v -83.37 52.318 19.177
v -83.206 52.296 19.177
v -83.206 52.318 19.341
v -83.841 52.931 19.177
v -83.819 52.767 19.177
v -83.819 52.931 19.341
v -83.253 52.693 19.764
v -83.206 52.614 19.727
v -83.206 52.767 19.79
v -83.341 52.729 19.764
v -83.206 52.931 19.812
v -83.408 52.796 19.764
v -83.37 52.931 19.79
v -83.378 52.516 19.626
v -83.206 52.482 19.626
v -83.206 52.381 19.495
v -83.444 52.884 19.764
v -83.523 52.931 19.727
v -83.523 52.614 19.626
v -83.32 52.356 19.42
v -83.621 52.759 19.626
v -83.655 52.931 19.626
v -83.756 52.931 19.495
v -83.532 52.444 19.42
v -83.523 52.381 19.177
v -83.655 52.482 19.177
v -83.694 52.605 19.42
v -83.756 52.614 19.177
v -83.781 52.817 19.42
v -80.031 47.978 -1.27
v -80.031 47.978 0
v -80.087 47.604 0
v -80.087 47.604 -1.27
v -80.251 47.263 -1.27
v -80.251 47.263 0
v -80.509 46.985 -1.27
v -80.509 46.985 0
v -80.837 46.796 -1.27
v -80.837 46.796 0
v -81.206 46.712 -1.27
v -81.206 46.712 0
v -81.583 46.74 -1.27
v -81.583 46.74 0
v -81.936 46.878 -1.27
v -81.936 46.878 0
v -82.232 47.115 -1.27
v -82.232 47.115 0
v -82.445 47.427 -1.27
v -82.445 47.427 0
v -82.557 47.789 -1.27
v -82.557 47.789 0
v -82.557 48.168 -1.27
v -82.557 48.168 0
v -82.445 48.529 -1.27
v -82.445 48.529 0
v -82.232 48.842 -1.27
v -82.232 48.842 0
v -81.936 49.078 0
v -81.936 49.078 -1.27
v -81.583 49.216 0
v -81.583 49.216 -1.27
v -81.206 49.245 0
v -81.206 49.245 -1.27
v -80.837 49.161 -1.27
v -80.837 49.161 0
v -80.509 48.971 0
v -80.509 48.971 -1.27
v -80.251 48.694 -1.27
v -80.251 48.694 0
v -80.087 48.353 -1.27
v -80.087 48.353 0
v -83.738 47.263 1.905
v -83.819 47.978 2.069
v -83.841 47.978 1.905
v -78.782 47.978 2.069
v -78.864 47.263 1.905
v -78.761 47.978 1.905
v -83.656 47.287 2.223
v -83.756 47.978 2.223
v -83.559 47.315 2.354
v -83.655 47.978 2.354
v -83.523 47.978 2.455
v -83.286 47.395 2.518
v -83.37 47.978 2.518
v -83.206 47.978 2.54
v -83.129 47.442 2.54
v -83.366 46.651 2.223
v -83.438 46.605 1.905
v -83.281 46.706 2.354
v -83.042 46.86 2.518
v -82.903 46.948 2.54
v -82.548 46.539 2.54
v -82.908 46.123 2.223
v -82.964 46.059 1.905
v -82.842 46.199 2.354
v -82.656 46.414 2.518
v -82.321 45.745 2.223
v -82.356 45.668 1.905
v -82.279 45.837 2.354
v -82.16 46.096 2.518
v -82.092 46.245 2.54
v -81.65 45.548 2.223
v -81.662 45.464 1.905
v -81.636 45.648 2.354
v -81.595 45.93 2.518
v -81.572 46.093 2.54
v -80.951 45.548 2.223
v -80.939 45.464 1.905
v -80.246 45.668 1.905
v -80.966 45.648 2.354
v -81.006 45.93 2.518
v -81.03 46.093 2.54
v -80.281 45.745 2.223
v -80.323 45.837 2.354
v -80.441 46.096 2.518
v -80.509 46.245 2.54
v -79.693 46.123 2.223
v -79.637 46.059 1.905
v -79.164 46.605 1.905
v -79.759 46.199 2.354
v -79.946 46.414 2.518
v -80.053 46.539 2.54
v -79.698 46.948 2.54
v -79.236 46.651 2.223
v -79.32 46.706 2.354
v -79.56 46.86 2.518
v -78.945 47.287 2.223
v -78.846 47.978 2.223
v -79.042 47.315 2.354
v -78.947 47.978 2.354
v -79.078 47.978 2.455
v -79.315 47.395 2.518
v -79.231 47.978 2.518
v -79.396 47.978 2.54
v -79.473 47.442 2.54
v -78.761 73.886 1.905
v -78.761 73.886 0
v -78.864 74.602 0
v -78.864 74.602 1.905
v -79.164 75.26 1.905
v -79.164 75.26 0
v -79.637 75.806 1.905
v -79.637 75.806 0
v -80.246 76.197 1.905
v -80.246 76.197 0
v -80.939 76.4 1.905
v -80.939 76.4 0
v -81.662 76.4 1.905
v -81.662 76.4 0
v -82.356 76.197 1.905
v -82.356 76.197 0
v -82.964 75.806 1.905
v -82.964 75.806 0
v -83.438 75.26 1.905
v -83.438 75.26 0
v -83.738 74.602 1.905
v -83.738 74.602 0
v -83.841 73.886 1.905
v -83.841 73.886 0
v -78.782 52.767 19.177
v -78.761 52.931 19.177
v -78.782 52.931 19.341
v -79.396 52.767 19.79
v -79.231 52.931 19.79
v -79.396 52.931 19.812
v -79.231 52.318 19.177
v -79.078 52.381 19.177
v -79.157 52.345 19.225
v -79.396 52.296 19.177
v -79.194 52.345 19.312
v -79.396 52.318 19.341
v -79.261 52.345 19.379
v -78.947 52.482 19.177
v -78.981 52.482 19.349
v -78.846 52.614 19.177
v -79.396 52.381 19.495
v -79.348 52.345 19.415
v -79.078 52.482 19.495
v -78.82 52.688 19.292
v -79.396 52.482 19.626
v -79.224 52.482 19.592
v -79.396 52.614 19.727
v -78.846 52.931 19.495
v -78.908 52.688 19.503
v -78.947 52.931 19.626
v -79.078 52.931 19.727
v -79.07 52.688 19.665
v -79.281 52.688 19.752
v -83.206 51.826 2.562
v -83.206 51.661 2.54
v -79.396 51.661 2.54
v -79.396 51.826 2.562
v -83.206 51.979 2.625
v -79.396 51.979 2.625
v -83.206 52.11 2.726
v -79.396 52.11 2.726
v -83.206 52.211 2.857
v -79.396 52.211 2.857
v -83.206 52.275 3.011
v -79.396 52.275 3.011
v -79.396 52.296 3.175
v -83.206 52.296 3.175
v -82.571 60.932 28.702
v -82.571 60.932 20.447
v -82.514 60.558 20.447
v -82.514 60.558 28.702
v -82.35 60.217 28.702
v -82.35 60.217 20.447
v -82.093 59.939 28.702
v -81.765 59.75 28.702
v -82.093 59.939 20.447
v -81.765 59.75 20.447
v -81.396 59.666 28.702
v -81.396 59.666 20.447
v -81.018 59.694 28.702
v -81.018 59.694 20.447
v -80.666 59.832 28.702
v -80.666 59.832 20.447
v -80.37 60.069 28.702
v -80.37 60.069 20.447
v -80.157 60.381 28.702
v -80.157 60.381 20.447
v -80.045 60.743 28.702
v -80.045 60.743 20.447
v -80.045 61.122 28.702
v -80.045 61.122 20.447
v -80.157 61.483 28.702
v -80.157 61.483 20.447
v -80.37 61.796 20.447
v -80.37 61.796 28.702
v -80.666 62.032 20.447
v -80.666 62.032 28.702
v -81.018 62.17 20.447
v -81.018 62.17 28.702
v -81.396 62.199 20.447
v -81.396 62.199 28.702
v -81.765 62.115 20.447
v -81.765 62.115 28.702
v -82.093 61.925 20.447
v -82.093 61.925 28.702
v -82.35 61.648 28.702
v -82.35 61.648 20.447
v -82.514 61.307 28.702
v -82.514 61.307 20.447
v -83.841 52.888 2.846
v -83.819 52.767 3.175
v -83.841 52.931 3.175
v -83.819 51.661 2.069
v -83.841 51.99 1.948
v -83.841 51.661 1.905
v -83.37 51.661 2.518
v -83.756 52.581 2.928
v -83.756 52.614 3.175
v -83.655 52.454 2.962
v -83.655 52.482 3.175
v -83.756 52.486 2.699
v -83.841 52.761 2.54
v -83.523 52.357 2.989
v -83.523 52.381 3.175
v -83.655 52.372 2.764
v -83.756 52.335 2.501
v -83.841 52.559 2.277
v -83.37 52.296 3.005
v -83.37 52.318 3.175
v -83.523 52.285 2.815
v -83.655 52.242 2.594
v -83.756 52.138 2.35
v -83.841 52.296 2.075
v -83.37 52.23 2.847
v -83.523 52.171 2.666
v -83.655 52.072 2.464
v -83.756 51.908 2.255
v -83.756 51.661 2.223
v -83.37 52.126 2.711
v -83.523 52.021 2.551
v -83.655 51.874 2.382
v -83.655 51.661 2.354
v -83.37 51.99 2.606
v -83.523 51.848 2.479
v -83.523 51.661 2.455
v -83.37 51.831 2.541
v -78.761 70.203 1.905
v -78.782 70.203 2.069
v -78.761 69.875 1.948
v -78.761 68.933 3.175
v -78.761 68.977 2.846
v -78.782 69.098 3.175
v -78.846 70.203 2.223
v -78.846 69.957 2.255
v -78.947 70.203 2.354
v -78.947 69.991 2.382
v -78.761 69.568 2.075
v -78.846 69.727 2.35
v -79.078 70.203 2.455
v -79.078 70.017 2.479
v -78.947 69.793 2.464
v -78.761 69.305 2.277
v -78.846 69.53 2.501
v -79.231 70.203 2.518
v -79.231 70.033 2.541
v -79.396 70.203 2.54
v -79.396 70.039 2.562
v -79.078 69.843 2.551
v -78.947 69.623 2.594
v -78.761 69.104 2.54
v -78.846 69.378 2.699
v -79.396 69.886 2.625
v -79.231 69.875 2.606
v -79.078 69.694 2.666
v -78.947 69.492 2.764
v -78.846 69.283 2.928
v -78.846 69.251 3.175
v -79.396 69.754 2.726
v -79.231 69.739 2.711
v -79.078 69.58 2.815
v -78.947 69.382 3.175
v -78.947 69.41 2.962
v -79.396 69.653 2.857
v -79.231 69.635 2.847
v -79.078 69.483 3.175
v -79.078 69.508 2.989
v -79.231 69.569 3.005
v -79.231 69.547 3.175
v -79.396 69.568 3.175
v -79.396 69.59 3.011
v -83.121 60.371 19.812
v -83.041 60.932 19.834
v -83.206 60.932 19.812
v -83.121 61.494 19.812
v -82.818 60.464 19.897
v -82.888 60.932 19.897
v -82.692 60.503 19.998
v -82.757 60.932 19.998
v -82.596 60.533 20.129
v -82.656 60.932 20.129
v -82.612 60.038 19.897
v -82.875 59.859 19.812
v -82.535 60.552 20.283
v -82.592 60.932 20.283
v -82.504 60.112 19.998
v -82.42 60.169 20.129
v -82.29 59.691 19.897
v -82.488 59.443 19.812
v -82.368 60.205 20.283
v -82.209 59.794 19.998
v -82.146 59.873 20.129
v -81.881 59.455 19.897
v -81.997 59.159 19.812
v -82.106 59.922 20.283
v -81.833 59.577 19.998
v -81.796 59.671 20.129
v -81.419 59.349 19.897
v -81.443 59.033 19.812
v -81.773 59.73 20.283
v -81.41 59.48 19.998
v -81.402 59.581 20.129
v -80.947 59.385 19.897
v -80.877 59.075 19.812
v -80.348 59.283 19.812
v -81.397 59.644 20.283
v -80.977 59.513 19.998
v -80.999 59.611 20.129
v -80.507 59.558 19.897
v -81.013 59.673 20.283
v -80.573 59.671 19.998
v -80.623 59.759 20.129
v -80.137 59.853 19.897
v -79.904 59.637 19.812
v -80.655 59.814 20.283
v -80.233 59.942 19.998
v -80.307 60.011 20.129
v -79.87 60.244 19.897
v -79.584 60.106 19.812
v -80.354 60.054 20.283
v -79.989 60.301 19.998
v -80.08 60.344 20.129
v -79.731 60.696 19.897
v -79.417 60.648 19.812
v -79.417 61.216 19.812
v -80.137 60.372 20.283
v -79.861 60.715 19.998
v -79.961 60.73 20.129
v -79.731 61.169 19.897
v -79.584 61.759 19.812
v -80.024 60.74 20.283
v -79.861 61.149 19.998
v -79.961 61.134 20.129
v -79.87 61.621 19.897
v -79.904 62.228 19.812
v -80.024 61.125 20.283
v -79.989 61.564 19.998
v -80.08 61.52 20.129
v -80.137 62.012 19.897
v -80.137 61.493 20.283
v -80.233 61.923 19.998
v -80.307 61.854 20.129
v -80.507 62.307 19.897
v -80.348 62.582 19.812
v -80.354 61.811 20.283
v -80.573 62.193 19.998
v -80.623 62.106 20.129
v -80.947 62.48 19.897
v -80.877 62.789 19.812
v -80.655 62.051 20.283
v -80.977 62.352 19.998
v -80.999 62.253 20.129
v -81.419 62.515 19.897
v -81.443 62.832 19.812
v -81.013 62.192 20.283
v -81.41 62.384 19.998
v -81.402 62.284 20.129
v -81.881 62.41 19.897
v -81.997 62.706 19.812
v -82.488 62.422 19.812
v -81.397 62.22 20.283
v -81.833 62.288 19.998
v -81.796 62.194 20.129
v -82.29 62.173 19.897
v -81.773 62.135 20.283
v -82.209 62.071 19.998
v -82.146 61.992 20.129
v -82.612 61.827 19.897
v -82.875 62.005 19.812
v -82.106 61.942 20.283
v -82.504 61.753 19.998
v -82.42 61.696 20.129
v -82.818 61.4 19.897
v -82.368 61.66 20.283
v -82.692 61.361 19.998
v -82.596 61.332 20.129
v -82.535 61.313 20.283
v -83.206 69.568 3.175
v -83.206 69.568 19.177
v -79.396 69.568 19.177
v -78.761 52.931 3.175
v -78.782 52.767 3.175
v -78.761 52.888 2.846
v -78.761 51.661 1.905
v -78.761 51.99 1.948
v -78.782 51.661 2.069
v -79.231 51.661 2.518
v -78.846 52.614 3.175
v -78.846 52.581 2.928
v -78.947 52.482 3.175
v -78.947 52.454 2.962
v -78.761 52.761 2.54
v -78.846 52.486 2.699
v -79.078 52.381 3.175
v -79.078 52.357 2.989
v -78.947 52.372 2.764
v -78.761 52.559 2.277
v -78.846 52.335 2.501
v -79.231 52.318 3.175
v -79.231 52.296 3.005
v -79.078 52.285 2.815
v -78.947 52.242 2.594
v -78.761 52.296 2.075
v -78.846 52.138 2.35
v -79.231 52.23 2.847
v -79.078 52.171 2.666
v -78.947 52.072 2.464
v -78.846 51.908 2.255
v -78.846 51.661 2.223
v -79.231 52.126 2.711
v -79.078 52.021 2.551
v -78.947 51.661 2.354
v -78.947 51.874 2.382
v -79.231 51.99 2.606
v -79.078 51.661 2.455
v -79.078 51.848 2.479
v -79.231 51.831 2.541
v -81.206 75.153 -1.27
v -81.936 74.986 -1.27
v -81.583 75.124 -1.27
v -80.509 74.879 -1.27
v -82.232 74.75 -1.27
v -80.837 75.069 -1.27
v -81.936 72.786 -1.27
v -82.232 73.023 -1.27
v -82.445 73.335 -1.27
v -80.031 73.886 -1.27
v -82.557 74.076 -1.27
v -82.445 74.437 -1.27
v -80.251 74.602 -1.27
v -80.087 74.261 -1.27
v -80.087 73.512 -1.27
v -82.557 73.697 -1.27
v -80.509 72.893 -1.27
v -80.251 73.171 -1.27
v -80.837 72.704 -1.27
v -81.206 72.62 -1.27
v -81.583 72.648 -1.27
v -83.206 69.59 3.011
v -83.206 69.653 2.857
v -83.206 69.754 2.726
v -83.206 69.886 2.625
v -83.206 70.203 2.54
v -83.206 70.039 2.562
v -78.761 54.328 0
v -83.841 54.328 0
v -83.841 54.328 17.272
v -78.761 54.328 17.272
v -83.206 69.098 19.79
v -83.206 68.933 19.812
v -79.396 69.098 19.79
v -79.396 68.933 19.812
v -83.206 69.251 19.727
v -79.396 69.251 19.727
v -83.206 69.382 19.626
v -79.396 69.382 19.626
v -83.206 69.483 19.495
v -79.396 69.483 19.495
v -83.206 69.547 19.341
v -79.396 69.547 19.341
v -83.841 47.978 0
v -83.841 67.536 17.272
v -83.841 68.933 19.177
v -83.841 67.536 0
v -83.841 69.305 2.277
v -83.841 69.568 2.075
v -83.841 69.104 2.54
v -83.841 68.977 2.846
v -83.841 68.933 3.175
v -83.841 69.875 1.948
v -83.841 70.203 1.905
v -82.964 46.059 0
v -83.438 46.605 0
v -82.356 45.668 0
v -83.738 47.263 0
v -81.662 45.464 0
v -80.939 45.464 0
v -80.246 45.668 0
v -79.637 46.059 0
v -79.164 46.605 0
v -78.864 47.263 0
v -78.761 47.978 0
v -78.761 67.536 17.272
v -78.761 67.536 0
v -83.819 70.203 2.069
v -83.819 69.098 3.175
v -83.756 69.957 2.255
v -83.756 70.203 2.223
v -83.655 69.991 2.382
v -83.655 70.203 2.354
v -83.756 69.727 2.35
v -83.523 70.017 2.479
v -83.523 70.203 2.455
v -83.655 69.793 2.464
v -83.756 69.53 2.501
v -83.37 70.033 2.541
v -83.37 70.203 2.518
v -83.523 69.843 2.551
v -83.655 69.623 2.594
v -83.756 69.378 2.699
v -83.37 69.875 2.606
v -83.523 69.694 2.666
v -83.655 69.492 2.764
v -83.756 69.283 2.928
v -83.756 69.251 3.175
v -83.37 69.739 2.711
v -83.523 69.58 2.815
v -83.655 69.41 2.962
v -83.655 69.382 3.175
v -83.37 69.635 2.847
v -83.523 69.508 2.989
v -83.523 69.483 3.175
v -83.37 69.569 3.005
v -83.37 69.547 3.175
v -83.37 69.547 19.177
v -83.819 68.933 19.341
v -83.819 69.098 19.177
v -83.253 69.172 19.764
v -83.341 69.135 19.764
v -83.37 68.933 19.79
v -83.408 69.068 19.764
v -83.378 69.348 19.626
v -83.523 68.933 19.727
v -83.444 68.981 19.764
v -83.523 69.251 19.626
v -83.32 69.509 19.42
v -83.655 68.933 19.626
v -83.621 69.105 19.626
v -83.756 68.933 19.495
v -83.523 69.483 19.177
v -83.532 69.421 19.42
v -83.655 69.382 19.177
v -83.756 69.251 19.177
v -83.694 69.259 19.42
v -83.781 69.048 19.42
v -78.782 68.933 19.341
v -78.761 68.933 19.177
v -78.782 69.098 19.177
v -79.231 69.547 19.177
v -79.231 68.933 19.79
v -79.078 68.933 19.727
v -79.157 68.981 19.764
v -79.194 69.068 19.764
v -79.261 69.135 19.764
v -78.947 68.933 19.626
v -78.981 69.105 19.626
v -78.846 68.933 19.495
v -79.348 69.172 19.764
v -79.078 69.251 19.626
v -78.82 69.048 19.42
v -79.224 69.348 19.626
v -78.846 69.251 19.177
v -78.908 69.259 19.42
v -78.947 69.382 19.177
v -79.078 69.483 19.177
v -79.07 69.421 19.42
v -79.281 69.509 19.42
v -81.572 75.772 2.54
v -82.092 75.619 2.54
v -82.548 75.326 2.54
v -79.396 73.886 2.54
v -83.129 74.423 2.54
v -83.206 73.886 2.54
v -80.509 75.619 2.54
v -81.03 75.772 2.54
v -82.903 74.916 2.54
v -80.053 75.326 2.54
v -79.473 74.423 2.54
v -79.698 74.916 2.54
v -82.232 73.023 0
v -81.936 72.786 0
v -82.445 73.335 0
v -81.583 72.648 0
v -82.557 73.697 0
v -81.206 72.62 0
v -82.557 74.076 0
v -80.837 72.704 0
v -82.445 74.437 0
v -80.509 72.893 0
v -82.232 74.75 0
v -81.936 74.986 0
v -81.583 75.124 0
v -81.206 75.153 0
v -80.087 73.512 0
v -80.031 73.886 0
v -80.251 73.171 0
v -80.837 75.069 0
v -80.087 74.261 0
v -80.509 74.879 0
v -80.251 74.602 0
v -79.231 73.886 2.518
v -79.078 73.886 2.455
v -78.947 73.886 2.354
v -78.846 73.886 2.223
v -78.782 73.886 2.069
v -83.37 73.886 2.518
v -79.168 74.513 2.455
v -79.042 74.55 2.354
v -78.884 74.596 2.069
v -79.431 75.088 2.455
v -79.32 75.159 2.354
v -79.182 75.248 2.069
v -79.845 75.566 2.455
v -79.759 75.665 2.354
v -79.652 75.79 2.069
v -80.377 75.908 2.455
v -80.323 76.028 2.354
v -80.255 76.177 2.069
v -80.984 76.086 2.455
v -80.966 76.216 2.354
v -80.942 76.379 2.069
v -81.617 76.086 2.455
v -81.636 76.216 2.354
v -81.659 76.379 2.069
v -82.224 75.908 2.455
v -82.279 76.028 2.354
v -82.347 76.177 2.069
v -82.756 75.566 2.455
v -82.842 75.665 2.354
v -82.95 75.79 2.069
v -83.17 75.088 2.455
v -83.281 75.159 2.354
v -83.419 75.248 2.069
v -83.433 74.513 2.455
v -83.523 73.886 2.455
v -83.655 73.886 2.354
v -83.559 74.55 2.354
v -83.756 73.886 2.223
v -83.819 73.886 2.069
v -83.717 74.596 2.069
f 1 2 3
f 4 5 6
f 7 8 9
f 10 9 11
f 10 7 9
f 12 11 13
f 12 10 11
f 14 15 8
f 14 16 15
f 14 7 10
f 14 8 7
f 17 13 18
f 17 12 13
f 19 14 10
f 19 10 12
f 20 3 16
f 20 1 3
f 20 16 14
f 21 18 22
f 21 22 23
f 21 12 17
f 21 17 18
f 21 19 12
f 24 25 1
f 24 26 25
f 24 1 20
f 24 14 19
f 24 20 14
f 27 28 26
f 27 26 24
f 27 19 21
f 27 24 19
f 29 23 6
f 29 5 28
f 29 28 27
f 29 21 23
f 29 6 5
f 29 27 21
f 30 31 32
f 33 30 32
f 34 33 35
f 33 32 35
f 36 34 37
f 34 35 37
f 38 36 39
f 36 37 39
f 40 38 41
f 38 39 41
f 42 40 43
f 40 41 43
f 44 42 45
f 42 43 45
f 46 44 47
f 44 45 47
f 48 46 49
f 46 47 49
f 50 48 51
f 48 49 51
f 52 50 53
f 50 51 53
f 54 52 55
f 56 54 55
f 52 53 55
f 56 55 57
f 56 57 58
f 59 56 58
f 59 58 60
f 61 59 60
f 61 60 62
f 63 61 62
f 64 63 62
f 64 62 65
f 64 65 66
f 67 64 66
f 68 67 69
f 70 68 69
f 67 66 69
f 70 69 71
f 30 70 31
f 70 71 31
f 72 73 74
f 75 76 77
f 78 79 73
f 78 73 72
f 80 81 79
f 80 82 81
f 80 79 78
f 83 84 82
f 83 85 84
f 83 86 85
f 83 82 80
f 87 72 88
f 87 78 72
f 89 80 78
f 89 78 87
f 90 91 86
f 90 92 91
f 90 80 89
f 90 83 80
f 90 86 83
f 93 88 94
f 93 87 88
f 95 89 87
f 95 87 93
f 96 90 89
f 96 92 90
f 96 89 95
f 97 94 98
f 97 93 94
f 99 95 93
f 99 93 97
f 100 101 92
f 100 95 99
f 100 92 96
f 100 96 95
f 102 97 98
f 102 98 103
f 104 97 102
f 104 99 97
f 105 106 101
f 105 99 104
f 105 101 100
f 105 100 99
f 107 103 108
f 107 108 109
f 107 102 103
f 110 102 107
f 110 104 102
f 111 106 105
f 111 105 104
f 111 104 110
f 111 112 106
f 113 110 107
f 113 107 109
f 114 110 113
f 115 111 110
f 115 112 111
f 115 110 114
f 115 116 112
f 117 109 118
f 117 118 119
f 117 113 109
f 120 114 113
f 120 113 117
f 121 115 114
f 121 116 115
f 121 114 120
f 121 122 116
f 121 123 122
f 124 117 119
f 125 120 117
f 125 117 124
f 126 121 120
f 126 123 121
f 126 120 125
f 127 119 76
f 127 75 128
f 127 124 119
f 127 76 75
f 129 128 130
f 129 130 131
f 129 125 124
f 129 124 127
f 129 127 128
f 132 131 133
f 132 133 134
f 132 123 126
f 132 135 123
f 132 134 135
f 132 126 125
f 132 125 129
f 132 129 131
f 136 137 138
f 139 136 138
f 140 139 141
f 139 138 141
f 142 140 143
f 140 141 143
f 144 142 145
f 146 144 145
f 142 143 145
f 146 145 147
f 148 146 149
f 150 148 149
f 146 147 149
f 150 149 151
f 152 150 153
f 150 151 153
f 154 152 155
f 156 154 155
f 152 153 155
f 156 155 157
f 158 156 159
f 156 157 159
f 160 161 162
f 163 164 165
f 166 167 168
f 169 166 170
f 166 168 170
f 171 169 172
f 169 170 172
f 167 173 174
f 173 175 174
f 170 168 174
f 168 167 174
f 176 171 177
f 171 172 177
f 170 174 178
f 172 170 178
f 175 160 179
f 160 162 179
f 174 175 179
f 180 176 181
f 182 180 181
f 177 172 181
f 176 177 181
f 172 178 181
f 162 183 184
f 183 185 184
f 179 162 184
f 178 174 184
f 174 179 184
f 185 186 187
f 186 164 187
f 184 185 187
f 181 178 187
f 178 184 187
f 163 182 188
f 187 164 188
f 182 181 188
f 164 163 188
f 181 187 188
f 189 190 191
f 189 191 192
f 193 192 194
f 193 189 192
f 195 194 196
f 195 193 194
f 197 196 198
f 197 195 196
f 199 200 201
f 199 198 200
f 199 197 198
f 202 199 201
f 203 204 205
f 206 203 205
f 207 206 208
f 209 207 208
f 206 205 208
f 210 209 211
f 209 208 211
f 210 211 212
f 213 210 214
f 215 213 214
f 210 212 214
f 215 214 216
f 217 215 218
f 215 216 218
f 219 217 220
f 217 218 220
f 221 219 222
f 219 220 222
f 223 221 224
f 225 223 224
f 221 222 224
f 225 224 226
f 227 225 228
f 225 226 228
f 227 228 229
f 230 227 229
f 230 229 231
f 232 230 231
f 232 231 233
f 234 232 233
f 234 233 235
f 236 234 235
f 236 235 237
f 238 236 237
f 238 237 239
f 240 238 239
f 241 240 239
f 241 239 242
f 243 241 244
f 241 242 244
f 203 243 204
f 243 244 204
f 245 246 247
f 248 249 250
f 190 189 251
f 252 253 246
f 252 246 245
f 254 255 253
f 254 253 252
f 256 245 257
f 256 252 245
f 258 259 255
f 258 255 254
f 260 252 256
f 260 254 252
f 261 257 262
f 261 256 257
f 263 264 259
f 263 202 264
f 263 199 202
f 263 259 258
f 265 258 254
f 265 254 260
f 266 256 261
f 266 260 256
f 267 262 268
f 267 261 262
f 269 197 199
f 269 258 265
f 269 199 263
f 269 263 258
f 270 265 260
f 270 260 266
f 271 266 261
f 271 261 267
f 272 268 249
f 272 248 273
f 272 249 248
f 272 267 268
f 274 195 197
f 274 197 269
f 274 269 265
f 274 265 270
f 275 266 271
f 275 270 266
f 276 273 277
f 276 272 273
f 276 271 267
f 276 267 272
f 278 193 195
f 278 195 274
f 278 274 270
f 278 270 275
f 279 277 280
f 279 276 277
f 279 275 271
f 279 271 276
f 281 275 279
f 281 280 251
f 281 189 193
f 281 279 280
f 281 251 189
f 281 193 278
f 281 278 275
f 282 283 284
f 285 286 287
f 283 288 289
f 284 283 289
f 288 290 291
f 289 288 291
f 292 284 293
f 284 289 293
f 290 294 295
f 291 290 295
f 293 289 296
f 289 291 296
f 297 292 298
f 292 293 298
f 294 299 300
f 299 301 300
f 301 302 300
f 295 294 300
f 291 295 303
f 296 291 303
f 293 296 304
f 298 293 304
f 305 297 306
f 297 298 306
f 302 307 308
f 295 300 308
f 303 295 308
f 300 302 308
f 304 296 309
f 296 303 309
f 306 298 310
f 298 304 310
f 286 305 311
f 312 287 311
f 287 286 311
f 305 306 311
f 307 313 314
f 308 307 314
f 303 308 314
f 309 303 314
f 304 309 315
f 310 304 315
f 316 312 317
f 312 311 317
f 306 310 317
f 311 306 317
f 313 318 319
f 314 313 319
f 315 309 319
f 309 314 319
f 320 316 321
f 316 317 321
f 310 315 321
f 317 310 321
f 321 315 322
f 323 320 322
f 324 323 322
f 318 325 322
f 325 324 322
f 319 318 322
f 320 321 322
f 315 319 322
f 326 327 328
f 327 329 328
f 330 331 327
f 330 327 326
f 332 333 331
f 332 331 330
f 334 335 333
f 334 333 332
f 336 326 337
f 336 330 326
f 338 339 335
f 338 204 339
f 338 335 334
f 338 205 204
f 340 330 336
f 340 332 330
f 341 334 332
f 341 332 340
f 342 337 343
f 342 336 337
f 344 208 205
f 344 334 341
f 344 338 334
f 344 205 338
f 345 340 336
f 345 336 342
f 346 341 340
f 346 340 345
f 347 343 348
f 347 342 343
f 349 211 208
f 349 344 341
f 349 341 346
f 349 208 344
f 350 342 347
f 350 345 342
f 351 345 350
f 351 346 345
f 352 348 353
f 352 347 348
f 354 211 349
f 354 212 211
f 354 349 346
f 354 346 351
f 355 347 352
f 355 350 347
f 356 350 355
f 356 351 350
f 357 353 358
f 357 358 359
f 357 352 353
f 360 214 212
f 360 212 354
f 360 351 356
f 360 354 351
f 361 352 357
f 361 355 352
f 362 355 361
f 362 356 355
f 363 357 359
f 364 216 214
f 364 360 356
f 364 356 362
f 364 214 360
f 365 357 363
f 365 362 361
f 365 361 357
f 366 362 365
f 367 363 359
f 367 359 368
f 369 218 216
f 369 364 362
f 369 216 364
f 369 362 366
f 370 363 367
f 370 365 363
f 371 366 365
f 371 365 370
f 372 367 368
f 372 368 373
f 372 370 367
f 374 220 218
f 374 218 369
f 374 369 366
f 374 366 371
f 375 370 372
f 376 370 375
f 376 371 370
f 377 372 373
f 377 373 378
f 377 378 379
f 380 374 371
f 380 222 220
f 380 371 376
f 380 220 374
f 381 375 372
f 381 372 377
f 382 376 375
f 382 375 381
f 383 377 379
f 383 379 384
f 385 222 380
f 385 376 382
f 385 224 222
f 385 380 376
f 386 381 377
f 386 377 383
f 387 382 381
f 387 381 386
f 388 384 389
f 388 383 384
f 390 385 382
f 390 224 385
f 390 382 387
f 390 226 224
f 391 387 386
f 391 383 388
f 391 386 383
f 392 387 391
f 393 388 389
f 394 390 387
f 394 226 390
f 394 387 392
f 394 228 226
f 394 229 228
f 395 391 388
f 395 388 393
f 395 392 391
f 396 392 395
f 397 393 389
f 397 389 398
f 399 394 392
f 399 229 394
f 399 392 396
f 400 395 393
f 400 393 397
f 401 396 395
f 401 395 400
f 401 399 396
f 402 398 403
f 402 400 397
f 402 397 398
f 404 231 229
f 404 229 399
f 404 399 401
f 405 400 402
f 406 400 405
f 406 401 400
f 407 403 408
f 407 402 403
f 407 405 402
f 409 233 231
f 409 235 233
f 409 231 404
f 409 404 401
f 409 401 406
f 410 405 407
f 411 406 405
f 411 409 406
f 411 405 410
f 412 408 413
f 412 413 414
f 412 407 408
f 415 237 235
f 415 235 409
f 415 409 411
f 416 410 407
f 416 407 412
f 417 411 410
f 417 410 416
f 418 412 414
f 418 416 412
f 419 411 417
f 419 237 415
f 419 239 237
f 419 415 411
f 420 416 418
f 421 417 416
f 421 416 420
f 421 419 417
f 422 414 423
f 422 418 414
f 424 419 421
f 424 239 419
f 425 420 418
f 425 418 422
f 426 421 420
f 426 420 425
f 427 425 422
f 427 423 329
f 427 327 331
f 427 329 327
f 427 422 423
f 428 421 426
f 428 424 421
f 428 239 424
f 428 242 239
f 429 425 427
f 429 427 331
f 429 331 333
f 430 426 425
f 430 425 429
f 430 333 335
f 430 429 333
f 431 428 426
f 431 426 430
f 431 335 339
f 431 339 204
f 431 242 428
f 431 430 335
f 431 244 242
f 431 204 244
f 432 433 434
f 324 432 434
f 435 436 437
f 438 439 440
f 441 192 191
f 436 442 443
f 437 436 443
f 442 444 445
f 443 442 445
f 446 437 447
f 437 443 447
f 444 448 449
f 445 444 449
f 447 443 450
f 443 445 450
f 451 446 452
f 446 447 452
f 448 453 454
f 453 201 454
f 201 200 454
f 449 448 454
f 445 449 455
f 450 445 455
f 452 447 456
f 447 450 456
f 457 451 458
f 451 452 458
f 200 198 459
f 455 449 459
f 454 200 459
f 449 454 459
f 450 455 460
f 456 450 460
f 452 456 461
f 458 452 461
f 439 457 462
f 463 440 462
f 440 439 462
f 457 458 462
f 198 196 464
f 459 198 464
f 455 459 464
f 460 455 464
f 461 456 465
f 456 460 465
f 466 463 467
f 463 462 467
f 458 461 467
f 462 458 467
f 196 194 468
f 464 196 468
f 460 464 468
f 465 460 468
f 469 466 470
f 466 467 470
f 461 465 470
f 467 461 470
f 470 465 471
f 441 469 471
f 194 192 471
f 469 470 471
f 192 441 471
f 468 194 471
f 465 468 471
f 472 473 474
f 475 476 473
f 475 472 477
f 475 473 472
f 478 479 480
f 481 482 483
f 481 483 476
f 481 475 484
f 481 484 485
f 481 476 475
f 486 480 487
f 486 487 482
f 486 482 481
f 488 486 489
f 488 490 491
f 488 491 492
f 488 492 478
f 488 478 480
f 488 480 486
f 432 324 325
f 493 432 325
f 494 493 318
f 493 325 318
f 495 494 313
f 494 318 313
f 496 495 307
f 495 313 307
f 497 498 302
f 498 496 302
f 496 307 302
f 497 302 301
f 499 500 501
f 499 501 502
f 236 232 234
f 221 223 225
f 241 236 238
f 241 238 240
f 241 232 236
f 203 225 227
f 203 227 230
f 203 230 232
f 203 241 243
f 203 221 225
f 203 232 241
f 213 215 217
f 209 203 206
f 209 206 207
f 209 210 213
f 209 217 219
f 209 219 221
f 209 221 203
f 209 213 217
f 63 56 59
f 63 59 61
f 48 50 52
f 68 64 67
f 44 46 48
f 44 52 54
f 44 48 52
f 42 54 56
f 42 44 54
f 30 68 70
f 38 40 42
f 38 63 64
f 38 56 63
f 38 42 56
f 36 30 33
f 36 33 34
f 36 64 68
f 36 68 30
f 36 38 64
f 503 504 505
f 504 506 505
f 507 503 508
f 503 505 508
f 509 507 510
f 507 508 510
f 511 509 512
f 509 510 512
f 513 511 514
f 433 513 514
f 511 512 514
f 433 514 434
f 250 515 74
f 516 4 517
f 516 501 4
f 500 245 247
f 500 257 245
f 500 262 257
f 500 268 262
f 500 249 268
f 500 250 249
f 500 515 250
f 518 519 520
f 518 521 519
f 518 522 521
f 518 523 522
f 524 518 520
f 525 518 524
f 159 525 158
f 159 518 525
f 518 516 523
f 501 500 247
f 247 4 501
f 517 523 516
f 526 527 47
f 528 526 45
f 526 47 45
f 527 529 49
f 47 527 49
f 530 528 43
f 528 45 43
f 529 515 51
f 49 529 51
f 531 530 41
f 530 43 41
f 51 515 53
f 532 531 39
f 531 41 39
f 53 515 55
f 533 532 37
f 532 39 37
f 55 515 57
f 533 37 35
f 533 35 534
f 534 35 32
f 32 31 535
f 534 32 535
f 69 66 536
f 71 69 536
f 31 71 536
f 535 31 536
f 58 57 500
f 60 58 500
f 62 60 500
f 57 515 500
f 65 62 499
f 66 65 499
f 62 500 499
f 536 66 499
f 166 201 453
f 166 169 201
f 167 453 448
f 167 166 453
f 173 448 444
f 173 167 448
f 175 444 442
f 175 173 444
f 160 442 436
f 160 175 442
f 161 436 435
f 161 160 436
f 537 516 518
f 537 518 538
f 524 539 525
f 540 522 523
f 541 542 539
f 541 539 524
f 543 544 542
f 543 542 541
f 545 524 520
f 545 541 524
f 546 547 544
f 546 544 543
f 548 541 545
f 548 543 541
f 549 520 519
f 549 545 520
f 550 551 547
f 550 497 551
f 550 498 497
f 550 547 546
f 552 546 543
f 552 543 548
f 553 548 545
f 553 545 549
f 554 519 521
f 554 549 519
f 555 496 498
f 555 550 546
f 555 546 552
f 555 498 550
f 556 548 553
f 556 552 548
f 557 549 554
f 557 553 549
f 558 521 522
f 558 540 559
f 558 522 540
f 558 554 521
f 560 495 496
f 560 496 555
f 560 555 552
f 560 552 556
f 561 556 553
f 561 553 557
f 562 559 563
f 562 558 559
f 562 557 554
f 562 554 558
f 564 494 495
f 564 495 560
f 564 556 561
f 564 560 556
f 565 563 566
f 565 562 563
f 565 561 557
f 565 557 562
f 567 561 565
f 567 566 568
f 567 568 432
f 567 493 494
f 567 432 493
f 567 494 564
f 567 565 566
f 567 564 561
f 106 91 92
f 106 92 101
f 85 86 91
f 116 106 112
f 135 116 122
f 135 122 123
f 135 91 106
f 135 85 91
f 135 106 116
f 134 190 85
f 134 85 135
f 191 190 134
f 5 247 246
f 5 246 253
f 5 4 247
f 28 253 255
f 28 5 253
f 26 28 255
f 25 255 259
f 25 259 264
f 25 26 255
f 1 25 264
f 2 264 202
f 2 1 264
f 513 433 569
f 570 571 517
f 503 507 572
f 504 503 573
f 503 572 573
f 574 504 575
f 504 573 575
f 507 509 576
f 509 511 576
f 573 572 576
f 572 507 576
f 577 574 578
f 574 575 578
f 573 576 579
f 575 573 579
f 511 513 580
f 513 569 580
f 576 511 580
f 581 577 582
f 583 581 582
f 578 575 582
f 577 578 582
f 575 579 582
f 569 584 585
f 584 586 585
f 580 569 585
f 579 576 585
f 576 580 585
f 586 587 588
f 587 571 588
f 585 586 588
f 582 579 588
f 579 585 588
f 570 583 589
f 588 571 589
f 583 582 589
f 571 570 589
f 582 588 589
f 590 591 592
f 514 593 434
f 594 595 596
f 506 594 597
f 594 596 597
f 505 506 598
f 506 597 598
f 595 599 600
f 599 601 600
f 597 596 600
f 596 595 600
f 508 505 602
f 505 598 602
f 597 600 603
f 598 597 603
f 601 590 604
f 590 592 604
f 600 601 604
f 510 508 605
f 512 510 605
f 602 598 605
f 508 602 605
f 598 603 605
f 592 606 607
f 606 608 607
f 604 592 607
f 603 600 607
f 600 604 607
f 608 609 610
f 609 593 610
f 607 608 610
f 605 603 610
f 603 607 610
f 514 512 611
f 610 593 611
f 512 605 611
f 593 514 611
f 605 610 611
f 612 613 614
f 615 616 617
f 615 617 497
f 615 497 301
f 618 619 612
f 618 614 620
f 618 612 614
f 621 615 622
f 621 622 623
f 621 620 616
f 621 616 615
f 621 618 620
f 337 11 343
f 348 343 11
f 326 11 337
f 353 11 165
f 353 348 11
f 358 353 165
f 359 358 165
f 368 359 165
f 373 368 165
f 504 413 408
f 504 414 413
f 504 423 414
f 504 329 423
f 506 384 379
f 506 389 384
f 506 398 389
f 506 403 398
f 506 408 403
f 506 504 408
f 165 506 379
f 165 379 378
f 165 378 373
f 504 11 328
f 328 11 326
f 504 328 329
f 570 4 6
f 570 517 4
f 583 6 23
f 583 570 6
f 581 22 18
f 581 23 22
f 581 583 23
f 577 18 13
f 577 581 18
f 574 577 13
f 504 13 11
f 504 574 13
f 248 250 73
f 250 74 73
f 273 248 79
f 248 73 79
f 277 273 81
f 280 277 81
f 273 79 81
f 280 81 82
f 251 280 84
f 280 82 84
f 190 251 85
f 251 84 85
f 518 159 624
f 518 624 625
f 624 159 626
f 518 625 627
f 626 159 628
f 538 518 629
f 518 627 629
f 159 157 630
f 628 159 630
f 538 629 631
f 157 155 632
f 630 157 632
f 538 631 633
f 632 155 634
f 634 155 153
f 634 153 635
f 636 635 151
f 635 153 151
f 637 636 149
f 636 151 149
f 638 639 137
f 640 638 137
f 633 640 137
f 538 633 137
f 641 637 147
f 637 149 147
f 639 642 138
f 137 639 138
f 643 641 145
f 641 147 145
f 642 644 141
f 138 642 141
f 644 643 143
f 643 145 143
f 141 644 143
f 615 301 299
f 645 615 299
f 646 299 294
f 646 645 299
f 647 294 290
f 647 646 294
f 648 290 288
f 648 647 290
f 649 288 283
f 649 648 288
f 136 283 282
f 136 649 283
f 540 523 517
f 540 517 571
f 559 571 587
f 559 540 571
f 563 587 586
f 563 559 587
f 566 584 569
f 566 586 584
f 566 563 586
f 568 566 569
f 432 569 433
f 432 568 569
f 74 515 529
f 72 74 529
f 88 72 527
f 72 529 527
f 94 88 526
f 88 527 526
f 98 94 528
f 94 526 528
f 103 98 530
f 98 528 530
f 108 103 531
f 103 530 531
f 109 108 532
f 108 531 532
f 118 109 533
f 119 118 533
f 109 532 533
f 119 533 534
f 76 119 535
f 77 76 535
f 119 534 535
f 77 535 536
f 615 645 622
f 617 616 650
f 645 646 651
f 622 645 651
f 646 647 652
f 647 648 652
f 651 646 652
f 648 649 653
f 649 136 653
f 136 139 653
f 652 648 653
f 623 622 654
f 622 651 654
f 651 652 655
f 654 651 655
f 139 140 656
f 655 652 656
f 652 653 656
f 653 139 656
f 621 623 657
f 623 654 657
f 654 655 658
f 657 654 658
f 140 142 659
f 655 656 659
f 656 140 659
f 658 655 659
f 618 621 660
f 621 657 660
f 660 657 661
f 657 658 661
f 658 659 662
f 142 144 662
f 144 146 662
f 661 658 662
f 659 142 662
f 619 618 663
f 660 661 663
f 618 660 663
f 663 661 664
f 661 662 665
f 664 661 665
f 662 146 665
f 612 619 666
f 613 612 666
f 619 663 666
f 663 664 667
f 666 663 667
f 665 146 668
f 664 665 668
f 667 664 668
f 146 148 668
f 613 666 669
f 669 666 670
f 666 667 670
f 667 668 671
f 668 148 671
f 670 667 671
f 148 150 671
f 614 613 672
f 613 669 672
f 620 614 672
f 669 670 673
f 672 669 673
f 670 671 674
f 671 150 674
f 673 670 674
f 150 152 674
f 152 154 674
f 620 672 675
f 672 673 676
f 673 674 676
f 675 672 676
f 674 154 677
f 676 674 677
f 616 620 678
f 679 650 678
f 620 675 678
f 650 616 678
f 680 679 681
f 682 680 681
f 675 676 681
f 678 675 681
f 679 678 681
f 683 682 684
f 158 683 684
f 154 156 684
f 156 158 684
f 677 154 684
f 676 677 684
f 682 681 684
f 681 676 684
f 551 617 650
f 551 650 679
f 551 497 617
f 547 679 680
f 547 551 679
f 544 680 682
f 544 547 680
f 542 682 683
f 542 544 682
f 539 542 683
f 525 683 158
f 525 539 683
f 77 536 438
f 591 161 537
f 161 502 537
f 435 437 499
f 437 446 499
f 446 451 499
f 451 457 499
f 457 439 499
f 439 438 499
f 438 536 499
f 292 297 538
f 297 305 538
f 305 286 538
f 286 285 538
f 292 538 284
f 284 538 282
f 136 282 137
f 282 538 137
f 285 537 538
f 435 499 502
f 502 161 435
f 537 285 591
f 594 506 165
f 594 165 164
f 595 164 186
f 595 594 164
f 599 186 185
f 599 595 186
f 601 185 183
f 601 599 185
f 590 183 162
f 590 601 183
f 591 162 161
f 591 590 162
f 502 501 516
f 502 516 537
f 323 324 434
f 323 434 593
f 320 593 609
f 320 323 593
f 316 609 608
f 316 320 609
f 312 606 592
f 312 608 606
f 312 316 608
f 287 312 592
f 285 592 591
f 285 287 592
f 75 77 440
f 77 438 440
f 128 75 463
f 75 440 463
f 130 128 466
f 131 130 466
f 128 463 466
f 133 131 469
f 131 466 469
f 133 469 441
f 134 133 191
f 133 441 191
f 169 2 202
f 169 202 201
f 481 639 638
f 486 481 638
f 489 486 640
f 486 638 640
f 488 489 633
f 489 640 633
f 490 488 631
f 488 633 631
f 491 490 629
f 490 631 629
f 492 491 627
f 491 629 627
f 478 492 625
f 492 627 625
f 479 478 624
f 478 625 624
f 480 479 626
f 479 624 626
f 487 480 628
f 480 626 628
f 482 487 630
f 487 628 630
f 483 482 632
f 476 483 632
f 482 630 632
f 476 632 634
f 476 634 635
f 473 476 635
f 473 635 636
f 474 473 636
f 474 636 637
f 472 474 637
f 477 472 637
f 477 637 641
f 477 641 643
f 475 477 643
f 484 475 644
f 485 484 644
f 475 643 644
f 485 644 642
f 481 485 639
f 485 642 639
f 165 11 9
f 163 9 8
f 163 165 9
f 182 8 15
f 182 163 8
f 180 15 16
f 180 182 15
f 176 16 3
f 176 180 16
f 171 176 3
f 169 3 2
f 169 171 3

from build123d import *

# Parameters (mm, degrees)
BOSS_EXTRUDE1_DEPTH = 2.54
SKETCH1_7_W         = 5.08
SKETCH1_7_H         = 2.032
BOSS_EXTRUDE2_DEPTH = 17.272
SKETCH2_W           = 5.08
SKETCH2_H           = 17.272
BOSS_EXTRUDE3_DEPTH = 2.54
SKETCH3_R           = 1.27
BOSS_EXTRUDE4_DEPTH = 8.89
FILLET1_R           = 0.635
SKETCH4_R           = 1.27
BOSS_EXTRUDE5_DEPTH = 1.27


with BuildPart() as part:
    # Sketch1 → Boss-Extrude1 (new body)
    with BuildSketch(Plane.XY):
        with BuildLine():
            ThreePointArc((-78.760738581, 73.886338755), (-81.300738581, 71.346338755), (-83.840738581, 73.886338755))
            Line((-83.840738581, 73.886338755), (-83.840738581, 69.568338755))
            Line((-83.840738581, 69.568338755), (-78.760738581, 69.568338755))
            Line((-78.760738581, 69.568338755), (-78.760738581, 73.886338755))
        make_face()
        with BuildLine():
            ThreePointArc((-78.760738581, 73.886338755), (-81.300738581, 76.426338755), (-83.840738581, 73.886338755))
            Line((-83.840738581, 73.886338755), (-78.760738581, 73.886338755))
        make_face()
        with BuildLine():
            Line((-78.760738581, 73.886338755), (-83.840738581, 73.886338755))
            ThreePointArc((-83.840738581, 73.886338755), (-81.300738581, 71.346338755), (-78.760738581, 73.886338755))
        make_face()
        with BuildLine():
            ThreePointArc((-78.760738581, 47.978338755), (-81.300738581, 50.518338755), (-83.840738581, 47.978338755))
            Line((-83.840738581, 47.978338755), (-78.760738581, 47.978338755))
        make_face()
        with BuildLine():
            Line((-78.760738581, 47.978338755), (-83.840738581, 47.978338755))
            ThreePointArc((-83.840738581, 47.978338755), (-81.300738581, 45.438338755), (-78.760738581, 47.978338755))
        make_face()
        with BuildLine():
            Line((-78.760738581, 52.296338755), (-83.840738581, 52.296338755))
            Line((-83.840738581, 52.296338755), (-83.840738581, 47.978338755))
            ThreePointArc((-83.840738581, 47.978338755), (-81.300738581, 50.518338755), (-78.760738581, 47.978338755))
            Line((-78.760738581, 47.978338755), (-78.760738581, 52.296338755))
        make_face()
    extrude(amount=BOSS_EXTRUDE1_DEPTH)

    # Sketch1<7> → Boss-Extrude2 (add)
    with BuildSketch(Plane.XY):
        with Locations((-81.300738581, 53.312338755)):
            Rectangle(SKETCH1_7_W, SKETCH1_7_H)
        Polygon((-78.760738581, 69.568338755), (-83.840738581, 69.568338755), (-83.840738581, 67.536338755), (-82.574456105, 67.536338755), (-78.760738581, 67.536338755), align=None)
    extrude(amount=BOSS_EXTRUDE2_DEPTH)

    # Sketch2 → Boss-Extrude3 (add)
    with BuildSketch(Plane.XY.offset(17.272)):
        with Locations((-81.300738581, 60.932338755)):
            Rectangle(SKETCH2_W, SKETCH2_H)
    extrude(amount=BOSS_EXTRUDE3_DEPTH)

    # Sketch3 → Boss-Extrude4 (add)
    with BuildSketch(Plane.XY.offset(19.812)):
        with Locations(Location((-81.300738581, 60.932338755, 0), (0, 0, 180))):
            Circle(SKETCH3_R)
    extrude(amount=BOSS_EXTRUDE4_DEPTH)

    # Fillet1
    fillet1_edges = [part.edges().sort_by_distance(p)[0] for p in [
        (-81.300738581, 76.426338755, 2.54),
        (-83.840738581, 71.727338755, 2.54),
        (-78.760738581, 69.568338755, 11.176),
        (-83.840738581, 69.568338755, 11.176),
        (-81.300738581, 69.568338755, 2.54),
        (-83.840738581, 52.296338755, 11.176),
        (-78.760738581, 60.932338755, 19.812),
        (-78.760738581, 52.296338755, 11.176),
        (-81.300738581, 69.568338755, 19.812),
        (-81.300738581, 52.296338755, 19.812),
        (-83.840738581, 60.932338755, 19.812),
        (-81.300738581, 45.438338755, 2.54),
        (-83.840738581, 50.137338755, 2.54),
        (-78.760738581, 50.137338755, 2.54),
        (-81.300738581, 52.296338755, 2.54),
        (-78.760738581, 71.727338755, 2.54),
        (-80.030738581, 60.932338755, 19.812),
    ]]
    fillet(fillet1_edges, radius=FILLET1_R - 0.0001)  # a hair under: the kernel refuses the full size

    # Sketch4 → Boss-Extrude5 (add)
    with BuildSketch(Plane(origin=(0, 0, 0), x_dir=(-1, 0, 0), z_dir=(0, 0, -1))):
        with Locations(Location((81.300738581, 73.886338755, 0), (0, 0, 180))):
            Circle(SKETCH4_R)
        with Locations(Location((81.300738581, 47.978338755, 0), (0, 0, 180))):
            Circle(SKETCH4_R)
    extrude(amount=BOSS_EXTRUDE5_DEPTH)


solid = part.part
